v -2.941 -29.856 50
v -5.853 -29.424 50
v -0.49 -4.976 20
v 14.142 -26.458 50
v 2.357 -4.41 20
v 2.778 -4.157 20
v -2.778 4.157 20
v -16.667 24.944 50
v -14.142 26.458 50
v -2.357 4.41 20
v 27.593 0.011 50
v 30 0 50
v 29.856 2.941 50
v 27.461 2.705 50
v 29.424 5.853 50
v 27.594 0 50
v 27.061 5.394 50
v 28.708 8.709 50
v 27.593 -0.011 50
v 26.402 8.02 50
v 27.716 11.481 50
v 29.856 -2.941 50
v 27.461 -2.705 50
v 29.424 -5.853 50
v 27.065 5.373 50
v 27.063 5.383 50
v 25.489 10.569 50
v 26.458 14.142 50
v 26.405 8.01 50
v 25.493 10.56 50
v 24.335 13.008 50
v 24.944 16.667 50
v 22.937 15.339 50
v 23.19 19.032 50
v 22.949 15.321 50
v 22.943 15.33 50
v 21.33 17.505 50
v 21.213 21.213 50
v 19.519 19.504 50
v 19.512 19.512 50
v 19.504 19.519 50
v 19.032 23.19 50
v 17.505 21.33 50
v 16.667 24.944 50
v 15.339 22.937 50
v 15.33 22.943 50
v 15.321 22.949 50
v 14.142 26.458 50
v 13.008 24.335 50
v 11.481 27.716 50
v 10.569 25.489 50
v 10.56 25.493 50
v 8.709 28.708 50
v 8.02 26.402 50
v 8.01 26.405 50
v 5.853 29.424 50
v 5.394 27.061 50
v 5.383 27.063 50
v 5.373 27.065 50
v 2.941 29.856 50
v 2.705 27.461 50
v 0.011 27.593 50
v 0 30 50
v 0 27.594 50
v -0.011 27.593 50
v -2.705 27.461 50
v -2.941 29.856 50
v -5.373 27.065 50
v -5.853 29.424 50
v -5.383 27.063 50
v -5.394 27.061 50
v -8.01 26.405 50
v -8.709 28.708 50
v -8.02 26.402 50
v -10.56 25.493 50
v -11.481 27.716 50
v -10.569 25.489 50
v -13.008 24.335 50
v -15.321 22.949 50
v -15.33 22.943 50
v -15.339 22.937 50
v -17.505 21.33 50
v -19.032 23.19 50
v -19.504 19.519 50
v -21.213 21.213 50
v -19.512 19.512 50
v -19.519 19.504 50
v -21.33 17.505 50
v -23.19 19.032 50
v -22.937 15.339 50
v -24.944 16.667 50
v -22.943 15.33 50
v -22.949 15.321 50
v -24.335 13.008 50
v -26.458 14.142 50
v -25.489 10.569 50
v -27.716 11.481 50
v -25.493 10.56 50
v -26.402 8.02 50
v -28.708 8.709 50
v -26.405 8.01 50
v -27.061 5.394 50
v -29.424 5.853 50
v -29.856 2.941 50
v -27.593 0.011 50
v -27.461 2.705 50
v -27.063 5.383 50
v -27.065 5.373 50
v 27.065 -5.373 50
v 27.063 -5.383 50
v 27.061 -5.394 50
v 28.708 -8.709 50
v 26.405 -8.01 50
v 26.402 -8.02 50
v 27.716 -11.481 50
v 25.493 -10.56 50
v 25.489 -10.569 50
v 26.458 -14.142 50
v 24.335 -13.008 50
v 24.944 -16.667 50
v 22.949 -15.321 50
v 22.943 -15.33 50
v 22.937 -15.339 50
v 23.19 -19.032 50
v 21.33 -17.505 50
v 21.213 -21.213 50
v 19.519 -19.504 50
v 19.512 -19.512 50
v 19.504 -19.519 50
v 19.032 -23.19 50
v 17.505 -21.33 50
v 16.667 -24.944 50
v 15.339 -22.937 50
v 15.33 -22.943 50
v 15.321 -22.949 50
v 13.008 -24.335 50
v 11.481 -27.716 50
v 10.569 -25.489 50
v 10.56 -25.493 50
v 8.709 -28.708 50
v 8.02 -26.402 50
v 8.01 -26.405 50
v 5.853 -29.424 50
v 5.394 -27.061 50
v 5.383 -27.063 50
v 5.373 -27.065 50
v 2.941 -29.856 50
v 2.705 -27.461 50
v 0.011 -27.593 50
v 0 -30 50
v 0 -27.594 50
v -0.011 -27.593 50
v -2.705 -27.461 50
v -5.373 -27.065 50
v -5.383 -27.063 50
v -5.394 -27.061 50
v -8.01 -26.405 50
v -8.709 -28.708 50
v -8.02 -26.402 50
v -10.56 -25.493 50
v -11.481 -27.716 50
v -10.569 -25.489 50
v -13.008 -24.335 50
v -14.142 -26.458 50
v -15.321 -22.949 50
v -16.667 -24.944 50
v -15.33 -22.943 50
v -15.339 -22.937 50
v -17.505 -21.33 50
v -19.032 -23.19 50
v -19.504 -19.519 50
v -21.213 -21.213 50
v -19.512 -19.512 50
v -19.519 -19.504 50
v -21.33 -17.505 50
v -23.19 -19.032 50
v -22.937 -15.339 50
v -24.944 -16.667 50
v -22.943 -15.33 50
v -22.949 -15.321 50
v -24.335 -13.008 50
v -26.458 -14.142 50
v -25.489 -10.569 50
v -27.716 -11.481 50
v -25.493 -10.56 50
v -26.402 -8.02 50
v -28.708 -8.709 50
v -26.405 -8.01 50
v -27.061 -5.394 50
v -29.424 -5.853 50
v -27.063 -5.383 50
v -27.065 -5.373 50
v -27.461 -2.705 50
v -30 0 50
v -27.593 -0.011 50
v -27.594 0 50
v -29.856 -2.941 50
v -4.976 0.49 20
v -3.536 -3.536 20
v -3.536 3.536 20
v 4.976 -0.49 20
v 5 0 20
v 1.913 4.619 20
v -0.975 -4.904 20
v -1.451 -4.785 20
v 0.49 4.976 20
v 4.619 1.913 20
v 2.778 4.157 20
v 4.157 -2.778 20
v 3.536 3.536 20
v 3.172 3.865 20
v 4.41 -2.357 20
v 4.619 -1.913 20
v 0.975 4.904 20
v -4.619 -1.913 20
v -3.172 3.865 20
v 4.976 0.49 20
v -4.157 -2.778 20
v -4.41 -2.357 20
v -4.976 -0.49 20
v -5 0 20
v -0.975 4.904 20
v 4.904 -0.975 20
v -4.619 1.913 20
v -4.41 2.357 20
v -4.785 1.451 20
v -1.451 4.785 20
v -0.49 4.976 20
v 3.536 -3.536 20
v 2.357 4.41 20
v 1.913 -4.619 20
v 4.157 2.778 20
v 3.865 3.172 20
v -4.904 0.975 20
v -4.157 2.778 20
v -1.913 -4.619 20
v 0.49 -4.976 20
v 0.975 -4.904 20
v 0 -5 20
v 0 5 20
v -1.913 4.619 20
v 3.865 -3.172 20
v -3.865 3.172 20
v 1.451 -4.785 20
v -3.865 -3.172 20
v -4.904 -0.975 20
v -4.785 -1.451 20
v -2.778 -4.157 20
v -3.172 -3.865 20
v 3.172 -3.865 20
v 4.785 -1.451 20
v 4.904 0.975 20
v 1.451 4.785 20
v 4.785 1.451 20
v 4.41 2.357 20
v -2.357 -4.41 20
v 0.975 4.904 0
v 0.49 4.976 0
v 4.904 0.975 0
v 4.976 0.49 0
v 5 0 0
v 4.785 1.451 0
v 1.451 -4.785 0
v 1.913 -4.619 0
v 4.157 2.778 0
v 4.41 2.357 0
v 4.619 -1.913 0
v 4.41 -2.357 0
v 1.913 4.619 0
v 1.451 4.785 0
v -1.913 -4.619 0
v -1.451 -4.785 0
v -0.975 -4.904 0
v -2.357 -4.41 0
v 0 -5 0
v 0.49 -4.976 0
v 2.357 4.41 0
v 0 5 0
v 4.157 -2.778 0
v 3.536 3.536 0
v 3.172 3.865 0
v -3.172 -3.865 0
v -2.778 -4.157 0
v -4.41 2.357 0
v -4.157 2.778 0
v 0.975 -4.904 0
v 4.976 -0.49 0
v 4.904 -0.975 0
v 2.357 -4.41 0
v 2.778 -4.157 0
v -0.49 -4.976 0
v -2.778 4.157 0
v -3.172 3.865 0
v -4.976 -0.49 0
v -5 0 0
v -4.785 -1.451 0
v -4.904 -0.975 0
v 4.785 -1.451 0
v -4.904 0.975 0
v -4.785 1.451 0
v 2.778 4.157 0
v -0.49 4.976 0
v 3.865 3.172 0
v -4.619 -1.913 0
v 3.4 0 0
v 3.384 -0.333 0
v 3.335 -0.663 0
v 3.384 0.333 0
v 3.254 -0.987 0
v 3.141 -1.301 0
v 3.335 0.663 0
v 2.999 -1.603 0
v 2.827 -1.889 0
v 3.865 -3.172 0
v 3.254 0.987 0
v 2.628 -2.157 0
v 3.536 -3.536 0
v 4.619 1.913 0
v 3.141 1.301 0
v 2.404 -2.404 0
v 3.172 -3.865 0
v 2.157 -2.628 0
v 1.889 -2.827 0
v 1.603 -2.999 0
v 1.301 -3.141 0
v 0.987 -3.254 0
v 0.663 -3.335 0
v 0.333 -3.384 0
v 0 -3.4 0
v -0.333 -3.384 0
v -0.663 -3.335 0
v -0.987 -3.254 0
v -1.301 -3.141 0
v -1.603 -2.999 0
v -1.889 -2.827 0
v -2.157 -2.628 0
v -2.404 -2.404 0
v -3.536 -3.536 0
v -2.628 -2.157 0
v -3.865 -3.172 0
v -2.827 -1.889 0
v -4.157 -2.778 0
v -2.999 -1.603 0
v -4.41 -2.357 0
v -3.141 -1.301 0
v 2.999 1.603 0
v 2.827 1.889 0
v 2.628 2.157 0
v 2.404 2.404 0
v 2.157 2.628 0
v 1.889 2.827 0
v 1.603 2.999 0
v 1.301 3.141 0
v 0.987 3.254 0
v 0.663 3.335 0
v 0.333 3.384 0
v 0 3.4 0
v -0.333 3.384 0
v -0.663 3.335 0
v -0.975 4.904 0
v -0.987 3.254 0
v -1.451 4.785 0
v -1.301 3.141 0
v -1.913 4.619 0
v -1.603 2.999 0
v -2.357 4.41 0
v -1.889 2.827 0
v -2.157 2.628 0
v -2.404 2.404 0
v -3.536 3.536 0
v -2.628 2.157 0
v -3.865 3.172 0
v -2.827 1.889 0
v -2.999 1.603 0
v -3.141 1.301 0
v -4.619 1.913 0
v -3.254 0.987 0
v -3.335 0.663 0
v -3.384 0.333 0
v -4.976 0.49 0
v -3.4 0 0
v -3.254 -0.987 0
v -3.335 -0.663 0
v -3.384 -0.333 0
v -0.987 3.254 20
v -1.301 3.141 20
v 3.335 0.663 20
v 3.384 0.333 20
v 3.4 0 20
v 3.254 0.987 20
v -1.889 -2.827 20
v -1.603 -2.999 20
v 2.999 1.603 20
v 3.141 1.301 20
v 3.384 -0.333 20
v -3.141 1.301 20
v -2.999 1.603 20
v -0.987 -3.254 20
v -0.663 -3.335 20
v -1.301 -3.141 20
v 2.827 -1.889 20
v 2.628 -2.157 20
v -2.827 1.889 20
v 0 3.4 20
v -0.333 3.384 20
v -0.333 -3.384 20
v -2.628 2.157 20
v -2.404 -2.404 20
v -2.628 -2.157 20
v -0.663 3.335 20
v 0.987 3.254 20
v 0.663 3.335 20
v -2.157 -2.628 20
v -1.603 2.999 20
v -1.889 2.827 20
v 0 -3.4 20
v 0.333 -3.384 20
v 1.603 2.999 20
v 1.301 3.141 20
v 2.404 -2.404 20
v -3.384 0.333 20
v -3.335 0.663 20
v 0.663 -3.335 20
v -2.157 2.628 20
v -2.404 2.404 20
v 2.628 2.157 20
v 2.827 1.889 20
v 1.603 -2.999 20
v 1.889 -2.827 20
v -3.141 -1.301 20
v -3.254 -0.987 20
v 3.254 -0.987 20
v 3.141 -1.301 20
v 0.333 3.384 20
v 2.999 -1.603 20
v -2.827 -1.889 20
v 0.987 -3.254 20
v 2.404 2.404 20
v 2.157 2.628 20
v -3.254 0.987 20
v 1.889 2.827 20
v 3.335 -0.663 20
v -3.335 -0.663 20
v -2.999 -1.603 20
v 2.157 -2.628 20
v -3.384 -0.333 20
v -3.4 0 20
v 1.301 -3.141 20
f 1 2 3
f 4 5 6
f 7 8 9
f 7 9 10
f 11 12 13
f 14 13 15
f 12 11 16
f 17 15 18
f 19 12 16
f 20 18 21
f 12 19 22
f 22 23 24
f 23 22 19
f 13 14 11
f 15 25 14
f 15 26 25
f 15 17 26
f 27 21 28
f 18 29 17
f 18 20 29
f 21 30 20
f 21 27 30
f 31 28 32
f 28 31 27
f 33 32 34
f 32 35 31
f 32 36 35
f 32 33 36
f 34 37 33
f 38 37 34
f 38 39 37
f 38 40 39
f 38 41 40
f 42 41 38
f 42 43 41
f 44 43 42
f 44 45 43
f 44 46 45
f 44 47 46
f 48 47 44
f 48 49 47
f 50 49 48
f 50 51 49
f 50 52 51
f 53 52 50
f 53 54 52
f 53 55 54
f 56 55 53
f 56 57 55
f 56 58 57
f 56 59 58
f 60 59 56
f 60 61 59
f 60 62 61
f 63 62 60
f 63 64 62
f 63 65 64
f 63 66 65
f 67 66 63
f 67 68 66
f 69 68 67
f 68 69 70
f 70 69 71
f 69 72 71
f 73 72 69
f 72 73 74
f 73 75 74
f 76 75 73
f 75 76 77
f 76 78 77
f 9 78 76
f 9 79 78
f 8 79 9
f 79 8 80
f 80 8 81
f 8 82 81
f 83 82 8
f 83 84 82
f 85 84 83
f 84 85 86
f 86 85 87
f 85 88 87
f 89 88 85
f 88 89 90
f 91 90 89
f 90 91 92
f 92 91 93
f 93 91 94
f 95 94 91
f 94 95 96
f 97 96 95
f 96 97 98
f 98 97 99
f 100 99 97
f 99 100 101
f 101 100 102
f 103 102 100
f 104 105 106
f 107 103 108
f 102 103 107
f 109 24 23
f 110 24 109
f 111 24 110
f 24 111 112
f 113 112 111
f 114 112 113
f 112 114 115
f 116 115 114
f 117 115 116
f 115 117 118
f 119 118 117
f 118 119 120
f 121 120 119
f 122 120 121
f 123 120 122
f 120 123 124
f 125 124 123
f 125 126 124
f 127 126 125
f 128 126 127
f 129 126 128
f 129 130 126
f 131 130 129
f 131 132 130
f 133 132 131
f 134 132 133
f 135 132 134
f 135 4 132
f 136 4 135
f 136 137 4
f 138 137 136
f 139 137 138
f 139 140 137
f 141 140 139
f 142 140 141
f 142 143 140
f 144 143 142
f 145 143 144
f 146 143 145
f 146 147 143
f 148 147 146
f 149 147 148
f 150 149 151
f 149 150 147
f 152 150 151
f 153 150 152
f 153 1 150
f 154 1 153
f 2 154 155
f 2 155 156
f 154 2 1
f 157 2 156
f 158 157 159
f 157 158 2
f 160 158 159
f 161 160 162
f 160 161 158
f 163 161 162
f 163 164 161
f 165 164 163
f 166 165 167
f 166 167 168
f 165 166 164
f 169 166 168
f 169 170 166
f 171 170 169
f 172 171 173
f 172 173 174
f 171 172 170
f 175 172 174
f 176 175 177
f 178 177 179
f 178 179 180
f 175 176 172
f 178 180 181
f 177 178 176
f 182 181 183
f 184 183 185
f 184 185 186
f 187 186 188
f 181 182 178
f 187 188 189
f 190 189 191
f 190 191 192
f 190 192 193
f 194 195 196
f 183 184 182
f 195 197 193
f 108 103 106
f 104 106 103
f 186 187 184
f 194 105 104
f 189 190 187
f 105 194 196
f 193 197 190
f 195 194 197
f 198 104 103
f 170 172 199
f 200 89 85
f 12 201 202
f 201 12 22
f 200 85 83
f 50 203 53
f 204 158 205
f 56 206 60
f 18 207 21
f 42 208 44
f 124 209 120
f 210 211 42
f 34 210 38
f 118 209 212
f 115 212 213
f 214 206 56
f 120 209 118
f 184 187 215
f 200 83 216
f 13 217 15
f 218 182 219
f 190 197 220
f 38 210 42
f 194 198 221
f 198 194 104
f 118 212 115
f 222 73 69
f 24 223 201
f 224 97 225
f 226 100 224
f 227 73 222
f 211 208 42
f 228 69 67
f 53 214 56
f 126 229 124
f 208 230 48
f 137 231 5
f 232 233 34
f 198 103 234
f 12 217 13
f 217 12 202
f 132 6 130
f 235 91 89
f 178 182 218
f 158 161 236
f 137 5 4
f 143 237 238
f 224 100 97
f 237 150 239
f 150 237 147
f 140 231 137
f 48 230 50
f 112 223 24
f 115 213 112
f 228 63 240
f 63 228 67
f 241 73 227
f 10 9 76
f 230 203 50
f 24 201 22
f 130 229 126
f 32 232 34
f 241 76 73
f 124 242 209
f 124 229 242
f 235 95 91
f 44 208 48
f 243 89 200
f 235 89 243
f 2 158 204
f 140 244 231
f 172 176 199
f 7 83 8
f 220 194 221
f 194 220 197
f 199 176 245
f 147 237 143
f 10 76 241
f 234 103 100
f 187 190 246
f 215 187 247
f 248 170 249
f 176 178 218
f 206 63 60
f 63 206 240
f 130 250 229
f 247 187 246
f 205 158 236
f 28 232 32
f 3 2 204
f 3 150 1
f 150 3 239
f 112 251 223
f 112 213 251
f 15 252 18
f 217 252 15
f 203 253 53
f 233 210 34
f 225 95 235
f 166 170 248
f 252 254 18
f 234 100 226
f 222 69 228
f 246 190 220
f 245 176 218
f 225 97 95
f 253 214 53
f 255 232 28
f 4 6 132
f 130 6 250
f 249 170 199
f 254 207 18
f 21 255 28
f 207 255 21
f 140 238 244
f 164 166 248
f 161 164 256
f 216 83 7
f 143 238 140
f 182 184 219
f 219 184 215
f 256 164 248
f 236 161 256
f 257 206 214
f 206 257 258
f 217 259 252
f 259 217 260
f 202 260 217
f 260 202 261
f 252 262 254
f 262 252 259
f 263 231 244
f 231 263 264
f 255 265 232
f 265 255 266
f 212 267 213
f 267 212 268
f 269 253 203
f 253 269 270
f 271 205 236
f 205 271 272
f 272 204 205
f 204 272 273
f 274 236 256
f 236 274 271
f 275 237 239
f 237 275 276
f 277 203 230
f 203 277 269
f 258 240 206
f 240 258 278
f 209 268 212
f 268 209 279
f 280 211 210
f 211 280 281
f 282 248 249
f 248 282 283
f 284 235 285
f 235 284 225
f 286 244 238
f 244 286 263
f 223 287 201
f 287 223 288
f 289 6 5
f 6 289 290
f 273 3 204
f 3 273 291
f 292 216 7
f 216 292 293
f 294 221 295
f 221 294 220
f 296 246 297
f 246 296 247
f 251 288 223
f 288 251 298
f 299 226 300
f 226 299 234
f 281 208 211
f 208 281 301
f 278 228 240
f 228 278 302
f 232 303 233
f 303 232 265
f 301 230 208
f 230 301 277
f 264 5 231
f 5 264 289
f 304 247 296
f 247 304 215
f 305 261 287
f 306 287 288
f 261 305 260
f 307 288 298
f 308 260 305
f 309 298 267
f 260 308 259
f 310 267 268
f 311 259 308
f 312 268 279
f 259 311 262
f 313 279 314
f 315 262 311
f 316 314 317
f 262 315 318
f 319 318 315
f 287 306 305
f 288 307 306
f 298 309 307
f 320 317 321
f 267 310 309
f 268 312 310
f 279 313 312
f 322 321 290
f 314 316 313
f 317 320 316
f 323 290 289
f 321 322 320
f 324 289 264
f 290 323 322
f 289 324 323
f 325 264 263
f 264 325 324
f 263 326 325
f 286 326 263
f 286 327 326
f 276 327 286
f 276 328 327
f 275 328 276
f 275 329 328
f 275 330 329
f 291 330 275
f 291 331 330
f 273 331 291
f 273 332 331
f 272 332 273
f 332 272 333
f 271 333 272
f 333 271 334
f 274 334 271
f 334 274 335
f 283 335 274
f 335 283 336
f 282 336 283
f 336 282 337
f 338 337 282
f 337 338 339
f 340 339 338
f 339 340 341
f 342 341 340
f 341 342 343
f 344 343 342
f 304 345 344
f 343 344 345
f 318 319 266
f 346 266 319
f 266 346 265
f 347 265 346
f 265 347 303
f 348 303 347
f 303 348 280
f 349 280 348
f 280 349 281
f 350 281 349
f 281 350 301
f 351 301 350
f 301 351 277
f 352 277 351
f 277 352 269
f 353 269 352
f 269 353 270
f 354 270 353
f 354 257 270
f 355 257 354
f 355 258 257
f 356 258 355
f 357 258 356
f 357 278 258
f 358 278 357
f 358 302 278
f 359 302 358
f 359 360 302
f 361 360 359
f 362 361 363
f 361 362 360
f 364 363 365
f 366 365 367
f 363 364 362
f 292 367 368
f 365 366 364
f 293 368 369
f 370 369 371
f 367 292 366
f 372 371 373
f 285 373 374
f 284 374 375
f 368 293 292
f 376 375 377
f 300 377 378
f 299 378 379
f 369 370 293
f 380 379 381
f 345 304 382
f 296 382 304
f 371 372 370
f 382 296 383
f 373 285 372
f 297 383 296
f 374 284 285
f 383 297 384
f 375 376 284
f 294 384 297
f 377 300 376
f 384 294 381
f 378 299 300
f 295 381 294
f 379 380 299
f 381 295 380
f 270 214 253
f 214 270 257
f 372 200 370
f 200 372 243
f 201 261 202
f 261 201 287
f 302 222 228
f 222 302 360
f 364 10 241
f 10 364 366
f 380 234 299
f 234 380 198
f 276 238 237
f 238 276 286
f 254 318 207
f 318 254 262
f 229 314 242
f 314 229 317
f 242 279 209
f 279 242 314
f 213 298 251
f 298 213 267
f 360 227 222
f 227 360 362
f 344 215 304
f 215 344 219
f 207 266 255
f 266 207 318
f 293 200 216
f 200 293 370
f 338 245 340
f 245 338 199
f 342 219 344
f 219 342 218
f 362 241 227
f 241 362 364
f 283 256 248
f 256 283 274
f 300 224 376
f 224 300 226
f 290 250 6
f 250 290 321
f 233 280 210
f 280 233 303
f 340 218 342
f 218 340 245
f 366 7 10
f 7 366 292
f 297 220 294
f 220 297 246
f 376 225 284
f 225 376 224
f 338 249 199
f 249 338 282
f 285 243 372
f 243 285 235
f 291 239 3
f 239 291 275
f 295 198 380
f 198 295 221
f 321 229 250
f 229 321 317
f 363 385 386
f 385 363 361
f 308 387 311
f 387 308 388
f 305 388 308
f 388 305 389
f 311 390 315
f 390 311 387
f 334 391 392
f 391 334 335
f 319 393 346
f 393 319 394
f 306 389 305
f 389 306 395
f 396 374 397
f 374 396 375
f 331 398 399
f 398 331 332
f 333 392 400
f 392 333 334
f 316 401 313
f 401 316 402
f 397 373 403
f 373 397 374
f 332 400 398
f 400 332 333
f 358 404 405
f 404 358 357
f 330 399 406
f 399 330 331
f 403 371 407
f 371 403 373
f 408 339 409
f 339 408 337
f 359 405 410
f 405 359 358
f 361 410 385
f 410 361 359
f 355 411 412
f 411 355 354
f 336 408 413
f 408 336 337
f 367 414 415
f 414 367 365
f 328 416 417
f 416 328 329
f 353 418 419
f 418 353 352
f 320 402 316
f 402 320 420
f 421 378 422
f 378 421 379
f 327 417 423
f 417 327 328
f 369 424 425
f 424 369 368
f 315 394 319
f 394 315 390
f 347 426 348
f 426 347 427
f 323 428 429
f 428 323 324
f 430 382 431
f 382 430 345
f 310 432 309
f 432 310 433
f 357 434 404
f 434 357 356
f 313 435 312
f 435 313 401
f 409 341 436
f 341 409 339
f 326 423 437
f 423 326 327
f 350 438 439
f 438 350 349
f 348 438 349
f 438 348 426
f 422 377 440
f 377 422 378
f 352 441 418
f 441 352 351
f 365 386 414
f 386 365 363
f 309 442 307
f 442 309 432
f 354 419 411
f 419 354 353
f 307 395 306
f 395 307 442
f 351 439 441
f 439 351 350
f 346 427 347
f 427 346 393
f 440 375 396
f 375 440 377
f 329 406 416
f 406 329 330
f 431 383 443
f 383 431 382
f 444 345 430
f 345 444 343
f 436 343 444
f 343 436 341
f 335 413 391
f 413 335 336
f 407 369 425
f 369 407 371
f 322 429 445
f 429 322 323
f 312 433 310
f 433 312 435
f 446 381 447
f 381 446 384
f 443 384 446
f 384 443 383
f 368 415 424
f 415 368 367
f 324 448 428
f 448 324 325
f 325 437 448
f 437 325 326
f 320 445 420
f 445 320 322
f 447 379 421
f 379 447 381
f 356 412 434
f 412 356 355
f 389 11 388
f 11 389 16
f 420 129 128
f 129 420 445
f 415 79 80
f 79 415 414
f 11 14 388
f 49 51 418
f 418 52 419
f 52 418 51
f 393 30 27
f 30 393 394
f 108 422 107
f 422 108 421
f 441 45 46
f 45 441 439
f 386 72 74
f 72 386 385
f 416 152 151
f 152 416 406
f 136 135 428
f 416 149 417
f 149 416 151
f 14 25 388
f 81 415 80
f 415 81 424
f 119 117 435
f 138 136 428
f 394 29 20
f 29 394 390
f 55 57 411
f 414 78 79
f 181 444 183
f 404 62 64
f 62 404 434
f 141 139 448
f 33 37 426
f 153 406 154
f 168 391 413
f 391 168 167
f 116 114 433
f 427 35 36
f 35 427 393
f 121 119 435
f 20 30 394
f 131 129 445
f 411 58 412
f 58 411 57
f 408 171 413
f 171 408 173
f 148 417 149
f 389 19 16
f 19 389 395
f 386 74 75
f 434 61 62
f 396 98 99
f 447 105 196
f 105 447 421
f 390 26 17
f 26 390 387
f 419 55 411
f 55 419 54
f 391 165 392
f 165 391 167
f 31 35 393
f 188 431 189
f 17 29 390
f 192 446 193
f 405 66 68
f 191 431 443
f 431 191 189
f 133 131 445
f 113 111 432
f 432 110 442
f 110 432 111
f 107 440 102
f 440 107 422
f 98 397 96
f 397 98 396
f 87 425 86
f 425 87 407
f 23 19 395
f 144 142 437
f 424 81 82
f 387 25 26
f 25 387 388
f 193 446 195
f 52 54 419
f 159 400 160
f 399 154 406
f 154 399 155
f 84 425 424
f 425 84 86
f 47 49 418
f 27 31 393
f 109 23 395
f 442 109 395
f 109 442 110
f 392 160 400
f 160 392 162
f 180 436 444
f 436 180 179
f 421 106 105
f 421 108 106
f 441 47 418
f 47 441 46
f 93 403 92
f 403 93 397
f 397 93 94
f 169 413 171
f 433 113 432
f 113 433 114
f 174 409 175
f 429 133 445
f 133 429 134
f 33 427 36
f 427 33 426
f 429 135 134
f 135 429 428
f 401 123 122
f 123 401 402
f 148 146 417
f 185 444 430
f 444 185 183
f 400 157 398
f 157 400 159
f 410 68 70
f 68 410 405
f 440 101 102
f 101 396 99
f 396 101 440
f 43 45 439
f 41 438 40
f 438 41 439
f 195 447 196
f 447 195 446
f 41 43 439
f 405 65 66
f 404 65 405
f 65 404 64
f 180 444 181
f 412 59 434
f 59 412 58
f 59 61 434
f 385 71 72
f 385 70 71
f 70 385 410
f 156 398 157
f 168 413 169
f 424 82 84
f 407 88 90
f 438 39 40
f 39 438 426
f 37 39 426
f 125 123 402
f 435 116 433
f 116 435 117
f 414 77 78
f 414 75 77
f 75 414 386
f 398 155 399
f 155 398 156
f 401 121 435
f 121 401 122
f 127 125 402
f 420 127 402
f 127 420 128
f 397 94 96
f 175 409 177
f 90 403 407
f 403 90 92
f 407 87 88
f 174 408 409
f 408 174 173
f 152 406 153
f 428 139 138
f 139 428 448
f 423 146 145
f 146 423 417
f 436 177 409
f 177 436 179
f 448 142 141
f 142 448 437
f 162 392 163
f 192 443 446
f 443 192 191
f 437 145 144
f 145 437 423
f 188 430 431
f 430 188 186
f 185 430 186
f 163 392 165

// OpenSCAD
// Funnel - a conical mouth narrowing into a straight spout, hollow with a constant wall. NOVEL
// general part (a generic funnel, not any one labware item).
//
// @desc hollow funnel: conical mouth into a straight spout
// @prompt Design a funnel in OpenSCAD: a cone {top} mm across the mouth narrowing over {cone_h} mm to a spout {spout_d} mm across and {spout_l} mm long, with a {wall} mm wall throughout. Reply with a single complete OpenSCAD file.
// @param top     mouth diameter, mm   [30:90]
// @param spout_d spout diameter, mm   [6:20]
// @param cone_h  cone height, mm      [20:60]
// @param spout_l spout length, mm     [10:40]
// @param wall    wall thickness, mm   [1.2:3]

top     = 60;
spout_d = 10;
cone_h  = 30;
spout_l = 20;
wall    = 1.6;

$fn = 64;

ib = max(1.6, spout_d - 2 * wall);   // keep the spout bore open even if the wall is thick

translate([0, 0, spout_l])          // rest the spout tip on the bed (z = 0)
difference() {
    union() {
        cylinder(h = cone_h, d1 = spout_d, d2 = top);                 // cone: spout end up to mouth
        translate([0, 0, -spout_l]) cylinder(h = spout_l + 0.01, d = spout_d);   // spout below
    }
    translate([0, 0, -spout_l - 1])
        cylinder(h = spout_l + 1 + 0.01, d = ib);                     // bore through the spout
    cylinder(h = cone_h + 1, d1 = ib, d2 = top - 2 * wall);           // inner cone, open mouth
}
